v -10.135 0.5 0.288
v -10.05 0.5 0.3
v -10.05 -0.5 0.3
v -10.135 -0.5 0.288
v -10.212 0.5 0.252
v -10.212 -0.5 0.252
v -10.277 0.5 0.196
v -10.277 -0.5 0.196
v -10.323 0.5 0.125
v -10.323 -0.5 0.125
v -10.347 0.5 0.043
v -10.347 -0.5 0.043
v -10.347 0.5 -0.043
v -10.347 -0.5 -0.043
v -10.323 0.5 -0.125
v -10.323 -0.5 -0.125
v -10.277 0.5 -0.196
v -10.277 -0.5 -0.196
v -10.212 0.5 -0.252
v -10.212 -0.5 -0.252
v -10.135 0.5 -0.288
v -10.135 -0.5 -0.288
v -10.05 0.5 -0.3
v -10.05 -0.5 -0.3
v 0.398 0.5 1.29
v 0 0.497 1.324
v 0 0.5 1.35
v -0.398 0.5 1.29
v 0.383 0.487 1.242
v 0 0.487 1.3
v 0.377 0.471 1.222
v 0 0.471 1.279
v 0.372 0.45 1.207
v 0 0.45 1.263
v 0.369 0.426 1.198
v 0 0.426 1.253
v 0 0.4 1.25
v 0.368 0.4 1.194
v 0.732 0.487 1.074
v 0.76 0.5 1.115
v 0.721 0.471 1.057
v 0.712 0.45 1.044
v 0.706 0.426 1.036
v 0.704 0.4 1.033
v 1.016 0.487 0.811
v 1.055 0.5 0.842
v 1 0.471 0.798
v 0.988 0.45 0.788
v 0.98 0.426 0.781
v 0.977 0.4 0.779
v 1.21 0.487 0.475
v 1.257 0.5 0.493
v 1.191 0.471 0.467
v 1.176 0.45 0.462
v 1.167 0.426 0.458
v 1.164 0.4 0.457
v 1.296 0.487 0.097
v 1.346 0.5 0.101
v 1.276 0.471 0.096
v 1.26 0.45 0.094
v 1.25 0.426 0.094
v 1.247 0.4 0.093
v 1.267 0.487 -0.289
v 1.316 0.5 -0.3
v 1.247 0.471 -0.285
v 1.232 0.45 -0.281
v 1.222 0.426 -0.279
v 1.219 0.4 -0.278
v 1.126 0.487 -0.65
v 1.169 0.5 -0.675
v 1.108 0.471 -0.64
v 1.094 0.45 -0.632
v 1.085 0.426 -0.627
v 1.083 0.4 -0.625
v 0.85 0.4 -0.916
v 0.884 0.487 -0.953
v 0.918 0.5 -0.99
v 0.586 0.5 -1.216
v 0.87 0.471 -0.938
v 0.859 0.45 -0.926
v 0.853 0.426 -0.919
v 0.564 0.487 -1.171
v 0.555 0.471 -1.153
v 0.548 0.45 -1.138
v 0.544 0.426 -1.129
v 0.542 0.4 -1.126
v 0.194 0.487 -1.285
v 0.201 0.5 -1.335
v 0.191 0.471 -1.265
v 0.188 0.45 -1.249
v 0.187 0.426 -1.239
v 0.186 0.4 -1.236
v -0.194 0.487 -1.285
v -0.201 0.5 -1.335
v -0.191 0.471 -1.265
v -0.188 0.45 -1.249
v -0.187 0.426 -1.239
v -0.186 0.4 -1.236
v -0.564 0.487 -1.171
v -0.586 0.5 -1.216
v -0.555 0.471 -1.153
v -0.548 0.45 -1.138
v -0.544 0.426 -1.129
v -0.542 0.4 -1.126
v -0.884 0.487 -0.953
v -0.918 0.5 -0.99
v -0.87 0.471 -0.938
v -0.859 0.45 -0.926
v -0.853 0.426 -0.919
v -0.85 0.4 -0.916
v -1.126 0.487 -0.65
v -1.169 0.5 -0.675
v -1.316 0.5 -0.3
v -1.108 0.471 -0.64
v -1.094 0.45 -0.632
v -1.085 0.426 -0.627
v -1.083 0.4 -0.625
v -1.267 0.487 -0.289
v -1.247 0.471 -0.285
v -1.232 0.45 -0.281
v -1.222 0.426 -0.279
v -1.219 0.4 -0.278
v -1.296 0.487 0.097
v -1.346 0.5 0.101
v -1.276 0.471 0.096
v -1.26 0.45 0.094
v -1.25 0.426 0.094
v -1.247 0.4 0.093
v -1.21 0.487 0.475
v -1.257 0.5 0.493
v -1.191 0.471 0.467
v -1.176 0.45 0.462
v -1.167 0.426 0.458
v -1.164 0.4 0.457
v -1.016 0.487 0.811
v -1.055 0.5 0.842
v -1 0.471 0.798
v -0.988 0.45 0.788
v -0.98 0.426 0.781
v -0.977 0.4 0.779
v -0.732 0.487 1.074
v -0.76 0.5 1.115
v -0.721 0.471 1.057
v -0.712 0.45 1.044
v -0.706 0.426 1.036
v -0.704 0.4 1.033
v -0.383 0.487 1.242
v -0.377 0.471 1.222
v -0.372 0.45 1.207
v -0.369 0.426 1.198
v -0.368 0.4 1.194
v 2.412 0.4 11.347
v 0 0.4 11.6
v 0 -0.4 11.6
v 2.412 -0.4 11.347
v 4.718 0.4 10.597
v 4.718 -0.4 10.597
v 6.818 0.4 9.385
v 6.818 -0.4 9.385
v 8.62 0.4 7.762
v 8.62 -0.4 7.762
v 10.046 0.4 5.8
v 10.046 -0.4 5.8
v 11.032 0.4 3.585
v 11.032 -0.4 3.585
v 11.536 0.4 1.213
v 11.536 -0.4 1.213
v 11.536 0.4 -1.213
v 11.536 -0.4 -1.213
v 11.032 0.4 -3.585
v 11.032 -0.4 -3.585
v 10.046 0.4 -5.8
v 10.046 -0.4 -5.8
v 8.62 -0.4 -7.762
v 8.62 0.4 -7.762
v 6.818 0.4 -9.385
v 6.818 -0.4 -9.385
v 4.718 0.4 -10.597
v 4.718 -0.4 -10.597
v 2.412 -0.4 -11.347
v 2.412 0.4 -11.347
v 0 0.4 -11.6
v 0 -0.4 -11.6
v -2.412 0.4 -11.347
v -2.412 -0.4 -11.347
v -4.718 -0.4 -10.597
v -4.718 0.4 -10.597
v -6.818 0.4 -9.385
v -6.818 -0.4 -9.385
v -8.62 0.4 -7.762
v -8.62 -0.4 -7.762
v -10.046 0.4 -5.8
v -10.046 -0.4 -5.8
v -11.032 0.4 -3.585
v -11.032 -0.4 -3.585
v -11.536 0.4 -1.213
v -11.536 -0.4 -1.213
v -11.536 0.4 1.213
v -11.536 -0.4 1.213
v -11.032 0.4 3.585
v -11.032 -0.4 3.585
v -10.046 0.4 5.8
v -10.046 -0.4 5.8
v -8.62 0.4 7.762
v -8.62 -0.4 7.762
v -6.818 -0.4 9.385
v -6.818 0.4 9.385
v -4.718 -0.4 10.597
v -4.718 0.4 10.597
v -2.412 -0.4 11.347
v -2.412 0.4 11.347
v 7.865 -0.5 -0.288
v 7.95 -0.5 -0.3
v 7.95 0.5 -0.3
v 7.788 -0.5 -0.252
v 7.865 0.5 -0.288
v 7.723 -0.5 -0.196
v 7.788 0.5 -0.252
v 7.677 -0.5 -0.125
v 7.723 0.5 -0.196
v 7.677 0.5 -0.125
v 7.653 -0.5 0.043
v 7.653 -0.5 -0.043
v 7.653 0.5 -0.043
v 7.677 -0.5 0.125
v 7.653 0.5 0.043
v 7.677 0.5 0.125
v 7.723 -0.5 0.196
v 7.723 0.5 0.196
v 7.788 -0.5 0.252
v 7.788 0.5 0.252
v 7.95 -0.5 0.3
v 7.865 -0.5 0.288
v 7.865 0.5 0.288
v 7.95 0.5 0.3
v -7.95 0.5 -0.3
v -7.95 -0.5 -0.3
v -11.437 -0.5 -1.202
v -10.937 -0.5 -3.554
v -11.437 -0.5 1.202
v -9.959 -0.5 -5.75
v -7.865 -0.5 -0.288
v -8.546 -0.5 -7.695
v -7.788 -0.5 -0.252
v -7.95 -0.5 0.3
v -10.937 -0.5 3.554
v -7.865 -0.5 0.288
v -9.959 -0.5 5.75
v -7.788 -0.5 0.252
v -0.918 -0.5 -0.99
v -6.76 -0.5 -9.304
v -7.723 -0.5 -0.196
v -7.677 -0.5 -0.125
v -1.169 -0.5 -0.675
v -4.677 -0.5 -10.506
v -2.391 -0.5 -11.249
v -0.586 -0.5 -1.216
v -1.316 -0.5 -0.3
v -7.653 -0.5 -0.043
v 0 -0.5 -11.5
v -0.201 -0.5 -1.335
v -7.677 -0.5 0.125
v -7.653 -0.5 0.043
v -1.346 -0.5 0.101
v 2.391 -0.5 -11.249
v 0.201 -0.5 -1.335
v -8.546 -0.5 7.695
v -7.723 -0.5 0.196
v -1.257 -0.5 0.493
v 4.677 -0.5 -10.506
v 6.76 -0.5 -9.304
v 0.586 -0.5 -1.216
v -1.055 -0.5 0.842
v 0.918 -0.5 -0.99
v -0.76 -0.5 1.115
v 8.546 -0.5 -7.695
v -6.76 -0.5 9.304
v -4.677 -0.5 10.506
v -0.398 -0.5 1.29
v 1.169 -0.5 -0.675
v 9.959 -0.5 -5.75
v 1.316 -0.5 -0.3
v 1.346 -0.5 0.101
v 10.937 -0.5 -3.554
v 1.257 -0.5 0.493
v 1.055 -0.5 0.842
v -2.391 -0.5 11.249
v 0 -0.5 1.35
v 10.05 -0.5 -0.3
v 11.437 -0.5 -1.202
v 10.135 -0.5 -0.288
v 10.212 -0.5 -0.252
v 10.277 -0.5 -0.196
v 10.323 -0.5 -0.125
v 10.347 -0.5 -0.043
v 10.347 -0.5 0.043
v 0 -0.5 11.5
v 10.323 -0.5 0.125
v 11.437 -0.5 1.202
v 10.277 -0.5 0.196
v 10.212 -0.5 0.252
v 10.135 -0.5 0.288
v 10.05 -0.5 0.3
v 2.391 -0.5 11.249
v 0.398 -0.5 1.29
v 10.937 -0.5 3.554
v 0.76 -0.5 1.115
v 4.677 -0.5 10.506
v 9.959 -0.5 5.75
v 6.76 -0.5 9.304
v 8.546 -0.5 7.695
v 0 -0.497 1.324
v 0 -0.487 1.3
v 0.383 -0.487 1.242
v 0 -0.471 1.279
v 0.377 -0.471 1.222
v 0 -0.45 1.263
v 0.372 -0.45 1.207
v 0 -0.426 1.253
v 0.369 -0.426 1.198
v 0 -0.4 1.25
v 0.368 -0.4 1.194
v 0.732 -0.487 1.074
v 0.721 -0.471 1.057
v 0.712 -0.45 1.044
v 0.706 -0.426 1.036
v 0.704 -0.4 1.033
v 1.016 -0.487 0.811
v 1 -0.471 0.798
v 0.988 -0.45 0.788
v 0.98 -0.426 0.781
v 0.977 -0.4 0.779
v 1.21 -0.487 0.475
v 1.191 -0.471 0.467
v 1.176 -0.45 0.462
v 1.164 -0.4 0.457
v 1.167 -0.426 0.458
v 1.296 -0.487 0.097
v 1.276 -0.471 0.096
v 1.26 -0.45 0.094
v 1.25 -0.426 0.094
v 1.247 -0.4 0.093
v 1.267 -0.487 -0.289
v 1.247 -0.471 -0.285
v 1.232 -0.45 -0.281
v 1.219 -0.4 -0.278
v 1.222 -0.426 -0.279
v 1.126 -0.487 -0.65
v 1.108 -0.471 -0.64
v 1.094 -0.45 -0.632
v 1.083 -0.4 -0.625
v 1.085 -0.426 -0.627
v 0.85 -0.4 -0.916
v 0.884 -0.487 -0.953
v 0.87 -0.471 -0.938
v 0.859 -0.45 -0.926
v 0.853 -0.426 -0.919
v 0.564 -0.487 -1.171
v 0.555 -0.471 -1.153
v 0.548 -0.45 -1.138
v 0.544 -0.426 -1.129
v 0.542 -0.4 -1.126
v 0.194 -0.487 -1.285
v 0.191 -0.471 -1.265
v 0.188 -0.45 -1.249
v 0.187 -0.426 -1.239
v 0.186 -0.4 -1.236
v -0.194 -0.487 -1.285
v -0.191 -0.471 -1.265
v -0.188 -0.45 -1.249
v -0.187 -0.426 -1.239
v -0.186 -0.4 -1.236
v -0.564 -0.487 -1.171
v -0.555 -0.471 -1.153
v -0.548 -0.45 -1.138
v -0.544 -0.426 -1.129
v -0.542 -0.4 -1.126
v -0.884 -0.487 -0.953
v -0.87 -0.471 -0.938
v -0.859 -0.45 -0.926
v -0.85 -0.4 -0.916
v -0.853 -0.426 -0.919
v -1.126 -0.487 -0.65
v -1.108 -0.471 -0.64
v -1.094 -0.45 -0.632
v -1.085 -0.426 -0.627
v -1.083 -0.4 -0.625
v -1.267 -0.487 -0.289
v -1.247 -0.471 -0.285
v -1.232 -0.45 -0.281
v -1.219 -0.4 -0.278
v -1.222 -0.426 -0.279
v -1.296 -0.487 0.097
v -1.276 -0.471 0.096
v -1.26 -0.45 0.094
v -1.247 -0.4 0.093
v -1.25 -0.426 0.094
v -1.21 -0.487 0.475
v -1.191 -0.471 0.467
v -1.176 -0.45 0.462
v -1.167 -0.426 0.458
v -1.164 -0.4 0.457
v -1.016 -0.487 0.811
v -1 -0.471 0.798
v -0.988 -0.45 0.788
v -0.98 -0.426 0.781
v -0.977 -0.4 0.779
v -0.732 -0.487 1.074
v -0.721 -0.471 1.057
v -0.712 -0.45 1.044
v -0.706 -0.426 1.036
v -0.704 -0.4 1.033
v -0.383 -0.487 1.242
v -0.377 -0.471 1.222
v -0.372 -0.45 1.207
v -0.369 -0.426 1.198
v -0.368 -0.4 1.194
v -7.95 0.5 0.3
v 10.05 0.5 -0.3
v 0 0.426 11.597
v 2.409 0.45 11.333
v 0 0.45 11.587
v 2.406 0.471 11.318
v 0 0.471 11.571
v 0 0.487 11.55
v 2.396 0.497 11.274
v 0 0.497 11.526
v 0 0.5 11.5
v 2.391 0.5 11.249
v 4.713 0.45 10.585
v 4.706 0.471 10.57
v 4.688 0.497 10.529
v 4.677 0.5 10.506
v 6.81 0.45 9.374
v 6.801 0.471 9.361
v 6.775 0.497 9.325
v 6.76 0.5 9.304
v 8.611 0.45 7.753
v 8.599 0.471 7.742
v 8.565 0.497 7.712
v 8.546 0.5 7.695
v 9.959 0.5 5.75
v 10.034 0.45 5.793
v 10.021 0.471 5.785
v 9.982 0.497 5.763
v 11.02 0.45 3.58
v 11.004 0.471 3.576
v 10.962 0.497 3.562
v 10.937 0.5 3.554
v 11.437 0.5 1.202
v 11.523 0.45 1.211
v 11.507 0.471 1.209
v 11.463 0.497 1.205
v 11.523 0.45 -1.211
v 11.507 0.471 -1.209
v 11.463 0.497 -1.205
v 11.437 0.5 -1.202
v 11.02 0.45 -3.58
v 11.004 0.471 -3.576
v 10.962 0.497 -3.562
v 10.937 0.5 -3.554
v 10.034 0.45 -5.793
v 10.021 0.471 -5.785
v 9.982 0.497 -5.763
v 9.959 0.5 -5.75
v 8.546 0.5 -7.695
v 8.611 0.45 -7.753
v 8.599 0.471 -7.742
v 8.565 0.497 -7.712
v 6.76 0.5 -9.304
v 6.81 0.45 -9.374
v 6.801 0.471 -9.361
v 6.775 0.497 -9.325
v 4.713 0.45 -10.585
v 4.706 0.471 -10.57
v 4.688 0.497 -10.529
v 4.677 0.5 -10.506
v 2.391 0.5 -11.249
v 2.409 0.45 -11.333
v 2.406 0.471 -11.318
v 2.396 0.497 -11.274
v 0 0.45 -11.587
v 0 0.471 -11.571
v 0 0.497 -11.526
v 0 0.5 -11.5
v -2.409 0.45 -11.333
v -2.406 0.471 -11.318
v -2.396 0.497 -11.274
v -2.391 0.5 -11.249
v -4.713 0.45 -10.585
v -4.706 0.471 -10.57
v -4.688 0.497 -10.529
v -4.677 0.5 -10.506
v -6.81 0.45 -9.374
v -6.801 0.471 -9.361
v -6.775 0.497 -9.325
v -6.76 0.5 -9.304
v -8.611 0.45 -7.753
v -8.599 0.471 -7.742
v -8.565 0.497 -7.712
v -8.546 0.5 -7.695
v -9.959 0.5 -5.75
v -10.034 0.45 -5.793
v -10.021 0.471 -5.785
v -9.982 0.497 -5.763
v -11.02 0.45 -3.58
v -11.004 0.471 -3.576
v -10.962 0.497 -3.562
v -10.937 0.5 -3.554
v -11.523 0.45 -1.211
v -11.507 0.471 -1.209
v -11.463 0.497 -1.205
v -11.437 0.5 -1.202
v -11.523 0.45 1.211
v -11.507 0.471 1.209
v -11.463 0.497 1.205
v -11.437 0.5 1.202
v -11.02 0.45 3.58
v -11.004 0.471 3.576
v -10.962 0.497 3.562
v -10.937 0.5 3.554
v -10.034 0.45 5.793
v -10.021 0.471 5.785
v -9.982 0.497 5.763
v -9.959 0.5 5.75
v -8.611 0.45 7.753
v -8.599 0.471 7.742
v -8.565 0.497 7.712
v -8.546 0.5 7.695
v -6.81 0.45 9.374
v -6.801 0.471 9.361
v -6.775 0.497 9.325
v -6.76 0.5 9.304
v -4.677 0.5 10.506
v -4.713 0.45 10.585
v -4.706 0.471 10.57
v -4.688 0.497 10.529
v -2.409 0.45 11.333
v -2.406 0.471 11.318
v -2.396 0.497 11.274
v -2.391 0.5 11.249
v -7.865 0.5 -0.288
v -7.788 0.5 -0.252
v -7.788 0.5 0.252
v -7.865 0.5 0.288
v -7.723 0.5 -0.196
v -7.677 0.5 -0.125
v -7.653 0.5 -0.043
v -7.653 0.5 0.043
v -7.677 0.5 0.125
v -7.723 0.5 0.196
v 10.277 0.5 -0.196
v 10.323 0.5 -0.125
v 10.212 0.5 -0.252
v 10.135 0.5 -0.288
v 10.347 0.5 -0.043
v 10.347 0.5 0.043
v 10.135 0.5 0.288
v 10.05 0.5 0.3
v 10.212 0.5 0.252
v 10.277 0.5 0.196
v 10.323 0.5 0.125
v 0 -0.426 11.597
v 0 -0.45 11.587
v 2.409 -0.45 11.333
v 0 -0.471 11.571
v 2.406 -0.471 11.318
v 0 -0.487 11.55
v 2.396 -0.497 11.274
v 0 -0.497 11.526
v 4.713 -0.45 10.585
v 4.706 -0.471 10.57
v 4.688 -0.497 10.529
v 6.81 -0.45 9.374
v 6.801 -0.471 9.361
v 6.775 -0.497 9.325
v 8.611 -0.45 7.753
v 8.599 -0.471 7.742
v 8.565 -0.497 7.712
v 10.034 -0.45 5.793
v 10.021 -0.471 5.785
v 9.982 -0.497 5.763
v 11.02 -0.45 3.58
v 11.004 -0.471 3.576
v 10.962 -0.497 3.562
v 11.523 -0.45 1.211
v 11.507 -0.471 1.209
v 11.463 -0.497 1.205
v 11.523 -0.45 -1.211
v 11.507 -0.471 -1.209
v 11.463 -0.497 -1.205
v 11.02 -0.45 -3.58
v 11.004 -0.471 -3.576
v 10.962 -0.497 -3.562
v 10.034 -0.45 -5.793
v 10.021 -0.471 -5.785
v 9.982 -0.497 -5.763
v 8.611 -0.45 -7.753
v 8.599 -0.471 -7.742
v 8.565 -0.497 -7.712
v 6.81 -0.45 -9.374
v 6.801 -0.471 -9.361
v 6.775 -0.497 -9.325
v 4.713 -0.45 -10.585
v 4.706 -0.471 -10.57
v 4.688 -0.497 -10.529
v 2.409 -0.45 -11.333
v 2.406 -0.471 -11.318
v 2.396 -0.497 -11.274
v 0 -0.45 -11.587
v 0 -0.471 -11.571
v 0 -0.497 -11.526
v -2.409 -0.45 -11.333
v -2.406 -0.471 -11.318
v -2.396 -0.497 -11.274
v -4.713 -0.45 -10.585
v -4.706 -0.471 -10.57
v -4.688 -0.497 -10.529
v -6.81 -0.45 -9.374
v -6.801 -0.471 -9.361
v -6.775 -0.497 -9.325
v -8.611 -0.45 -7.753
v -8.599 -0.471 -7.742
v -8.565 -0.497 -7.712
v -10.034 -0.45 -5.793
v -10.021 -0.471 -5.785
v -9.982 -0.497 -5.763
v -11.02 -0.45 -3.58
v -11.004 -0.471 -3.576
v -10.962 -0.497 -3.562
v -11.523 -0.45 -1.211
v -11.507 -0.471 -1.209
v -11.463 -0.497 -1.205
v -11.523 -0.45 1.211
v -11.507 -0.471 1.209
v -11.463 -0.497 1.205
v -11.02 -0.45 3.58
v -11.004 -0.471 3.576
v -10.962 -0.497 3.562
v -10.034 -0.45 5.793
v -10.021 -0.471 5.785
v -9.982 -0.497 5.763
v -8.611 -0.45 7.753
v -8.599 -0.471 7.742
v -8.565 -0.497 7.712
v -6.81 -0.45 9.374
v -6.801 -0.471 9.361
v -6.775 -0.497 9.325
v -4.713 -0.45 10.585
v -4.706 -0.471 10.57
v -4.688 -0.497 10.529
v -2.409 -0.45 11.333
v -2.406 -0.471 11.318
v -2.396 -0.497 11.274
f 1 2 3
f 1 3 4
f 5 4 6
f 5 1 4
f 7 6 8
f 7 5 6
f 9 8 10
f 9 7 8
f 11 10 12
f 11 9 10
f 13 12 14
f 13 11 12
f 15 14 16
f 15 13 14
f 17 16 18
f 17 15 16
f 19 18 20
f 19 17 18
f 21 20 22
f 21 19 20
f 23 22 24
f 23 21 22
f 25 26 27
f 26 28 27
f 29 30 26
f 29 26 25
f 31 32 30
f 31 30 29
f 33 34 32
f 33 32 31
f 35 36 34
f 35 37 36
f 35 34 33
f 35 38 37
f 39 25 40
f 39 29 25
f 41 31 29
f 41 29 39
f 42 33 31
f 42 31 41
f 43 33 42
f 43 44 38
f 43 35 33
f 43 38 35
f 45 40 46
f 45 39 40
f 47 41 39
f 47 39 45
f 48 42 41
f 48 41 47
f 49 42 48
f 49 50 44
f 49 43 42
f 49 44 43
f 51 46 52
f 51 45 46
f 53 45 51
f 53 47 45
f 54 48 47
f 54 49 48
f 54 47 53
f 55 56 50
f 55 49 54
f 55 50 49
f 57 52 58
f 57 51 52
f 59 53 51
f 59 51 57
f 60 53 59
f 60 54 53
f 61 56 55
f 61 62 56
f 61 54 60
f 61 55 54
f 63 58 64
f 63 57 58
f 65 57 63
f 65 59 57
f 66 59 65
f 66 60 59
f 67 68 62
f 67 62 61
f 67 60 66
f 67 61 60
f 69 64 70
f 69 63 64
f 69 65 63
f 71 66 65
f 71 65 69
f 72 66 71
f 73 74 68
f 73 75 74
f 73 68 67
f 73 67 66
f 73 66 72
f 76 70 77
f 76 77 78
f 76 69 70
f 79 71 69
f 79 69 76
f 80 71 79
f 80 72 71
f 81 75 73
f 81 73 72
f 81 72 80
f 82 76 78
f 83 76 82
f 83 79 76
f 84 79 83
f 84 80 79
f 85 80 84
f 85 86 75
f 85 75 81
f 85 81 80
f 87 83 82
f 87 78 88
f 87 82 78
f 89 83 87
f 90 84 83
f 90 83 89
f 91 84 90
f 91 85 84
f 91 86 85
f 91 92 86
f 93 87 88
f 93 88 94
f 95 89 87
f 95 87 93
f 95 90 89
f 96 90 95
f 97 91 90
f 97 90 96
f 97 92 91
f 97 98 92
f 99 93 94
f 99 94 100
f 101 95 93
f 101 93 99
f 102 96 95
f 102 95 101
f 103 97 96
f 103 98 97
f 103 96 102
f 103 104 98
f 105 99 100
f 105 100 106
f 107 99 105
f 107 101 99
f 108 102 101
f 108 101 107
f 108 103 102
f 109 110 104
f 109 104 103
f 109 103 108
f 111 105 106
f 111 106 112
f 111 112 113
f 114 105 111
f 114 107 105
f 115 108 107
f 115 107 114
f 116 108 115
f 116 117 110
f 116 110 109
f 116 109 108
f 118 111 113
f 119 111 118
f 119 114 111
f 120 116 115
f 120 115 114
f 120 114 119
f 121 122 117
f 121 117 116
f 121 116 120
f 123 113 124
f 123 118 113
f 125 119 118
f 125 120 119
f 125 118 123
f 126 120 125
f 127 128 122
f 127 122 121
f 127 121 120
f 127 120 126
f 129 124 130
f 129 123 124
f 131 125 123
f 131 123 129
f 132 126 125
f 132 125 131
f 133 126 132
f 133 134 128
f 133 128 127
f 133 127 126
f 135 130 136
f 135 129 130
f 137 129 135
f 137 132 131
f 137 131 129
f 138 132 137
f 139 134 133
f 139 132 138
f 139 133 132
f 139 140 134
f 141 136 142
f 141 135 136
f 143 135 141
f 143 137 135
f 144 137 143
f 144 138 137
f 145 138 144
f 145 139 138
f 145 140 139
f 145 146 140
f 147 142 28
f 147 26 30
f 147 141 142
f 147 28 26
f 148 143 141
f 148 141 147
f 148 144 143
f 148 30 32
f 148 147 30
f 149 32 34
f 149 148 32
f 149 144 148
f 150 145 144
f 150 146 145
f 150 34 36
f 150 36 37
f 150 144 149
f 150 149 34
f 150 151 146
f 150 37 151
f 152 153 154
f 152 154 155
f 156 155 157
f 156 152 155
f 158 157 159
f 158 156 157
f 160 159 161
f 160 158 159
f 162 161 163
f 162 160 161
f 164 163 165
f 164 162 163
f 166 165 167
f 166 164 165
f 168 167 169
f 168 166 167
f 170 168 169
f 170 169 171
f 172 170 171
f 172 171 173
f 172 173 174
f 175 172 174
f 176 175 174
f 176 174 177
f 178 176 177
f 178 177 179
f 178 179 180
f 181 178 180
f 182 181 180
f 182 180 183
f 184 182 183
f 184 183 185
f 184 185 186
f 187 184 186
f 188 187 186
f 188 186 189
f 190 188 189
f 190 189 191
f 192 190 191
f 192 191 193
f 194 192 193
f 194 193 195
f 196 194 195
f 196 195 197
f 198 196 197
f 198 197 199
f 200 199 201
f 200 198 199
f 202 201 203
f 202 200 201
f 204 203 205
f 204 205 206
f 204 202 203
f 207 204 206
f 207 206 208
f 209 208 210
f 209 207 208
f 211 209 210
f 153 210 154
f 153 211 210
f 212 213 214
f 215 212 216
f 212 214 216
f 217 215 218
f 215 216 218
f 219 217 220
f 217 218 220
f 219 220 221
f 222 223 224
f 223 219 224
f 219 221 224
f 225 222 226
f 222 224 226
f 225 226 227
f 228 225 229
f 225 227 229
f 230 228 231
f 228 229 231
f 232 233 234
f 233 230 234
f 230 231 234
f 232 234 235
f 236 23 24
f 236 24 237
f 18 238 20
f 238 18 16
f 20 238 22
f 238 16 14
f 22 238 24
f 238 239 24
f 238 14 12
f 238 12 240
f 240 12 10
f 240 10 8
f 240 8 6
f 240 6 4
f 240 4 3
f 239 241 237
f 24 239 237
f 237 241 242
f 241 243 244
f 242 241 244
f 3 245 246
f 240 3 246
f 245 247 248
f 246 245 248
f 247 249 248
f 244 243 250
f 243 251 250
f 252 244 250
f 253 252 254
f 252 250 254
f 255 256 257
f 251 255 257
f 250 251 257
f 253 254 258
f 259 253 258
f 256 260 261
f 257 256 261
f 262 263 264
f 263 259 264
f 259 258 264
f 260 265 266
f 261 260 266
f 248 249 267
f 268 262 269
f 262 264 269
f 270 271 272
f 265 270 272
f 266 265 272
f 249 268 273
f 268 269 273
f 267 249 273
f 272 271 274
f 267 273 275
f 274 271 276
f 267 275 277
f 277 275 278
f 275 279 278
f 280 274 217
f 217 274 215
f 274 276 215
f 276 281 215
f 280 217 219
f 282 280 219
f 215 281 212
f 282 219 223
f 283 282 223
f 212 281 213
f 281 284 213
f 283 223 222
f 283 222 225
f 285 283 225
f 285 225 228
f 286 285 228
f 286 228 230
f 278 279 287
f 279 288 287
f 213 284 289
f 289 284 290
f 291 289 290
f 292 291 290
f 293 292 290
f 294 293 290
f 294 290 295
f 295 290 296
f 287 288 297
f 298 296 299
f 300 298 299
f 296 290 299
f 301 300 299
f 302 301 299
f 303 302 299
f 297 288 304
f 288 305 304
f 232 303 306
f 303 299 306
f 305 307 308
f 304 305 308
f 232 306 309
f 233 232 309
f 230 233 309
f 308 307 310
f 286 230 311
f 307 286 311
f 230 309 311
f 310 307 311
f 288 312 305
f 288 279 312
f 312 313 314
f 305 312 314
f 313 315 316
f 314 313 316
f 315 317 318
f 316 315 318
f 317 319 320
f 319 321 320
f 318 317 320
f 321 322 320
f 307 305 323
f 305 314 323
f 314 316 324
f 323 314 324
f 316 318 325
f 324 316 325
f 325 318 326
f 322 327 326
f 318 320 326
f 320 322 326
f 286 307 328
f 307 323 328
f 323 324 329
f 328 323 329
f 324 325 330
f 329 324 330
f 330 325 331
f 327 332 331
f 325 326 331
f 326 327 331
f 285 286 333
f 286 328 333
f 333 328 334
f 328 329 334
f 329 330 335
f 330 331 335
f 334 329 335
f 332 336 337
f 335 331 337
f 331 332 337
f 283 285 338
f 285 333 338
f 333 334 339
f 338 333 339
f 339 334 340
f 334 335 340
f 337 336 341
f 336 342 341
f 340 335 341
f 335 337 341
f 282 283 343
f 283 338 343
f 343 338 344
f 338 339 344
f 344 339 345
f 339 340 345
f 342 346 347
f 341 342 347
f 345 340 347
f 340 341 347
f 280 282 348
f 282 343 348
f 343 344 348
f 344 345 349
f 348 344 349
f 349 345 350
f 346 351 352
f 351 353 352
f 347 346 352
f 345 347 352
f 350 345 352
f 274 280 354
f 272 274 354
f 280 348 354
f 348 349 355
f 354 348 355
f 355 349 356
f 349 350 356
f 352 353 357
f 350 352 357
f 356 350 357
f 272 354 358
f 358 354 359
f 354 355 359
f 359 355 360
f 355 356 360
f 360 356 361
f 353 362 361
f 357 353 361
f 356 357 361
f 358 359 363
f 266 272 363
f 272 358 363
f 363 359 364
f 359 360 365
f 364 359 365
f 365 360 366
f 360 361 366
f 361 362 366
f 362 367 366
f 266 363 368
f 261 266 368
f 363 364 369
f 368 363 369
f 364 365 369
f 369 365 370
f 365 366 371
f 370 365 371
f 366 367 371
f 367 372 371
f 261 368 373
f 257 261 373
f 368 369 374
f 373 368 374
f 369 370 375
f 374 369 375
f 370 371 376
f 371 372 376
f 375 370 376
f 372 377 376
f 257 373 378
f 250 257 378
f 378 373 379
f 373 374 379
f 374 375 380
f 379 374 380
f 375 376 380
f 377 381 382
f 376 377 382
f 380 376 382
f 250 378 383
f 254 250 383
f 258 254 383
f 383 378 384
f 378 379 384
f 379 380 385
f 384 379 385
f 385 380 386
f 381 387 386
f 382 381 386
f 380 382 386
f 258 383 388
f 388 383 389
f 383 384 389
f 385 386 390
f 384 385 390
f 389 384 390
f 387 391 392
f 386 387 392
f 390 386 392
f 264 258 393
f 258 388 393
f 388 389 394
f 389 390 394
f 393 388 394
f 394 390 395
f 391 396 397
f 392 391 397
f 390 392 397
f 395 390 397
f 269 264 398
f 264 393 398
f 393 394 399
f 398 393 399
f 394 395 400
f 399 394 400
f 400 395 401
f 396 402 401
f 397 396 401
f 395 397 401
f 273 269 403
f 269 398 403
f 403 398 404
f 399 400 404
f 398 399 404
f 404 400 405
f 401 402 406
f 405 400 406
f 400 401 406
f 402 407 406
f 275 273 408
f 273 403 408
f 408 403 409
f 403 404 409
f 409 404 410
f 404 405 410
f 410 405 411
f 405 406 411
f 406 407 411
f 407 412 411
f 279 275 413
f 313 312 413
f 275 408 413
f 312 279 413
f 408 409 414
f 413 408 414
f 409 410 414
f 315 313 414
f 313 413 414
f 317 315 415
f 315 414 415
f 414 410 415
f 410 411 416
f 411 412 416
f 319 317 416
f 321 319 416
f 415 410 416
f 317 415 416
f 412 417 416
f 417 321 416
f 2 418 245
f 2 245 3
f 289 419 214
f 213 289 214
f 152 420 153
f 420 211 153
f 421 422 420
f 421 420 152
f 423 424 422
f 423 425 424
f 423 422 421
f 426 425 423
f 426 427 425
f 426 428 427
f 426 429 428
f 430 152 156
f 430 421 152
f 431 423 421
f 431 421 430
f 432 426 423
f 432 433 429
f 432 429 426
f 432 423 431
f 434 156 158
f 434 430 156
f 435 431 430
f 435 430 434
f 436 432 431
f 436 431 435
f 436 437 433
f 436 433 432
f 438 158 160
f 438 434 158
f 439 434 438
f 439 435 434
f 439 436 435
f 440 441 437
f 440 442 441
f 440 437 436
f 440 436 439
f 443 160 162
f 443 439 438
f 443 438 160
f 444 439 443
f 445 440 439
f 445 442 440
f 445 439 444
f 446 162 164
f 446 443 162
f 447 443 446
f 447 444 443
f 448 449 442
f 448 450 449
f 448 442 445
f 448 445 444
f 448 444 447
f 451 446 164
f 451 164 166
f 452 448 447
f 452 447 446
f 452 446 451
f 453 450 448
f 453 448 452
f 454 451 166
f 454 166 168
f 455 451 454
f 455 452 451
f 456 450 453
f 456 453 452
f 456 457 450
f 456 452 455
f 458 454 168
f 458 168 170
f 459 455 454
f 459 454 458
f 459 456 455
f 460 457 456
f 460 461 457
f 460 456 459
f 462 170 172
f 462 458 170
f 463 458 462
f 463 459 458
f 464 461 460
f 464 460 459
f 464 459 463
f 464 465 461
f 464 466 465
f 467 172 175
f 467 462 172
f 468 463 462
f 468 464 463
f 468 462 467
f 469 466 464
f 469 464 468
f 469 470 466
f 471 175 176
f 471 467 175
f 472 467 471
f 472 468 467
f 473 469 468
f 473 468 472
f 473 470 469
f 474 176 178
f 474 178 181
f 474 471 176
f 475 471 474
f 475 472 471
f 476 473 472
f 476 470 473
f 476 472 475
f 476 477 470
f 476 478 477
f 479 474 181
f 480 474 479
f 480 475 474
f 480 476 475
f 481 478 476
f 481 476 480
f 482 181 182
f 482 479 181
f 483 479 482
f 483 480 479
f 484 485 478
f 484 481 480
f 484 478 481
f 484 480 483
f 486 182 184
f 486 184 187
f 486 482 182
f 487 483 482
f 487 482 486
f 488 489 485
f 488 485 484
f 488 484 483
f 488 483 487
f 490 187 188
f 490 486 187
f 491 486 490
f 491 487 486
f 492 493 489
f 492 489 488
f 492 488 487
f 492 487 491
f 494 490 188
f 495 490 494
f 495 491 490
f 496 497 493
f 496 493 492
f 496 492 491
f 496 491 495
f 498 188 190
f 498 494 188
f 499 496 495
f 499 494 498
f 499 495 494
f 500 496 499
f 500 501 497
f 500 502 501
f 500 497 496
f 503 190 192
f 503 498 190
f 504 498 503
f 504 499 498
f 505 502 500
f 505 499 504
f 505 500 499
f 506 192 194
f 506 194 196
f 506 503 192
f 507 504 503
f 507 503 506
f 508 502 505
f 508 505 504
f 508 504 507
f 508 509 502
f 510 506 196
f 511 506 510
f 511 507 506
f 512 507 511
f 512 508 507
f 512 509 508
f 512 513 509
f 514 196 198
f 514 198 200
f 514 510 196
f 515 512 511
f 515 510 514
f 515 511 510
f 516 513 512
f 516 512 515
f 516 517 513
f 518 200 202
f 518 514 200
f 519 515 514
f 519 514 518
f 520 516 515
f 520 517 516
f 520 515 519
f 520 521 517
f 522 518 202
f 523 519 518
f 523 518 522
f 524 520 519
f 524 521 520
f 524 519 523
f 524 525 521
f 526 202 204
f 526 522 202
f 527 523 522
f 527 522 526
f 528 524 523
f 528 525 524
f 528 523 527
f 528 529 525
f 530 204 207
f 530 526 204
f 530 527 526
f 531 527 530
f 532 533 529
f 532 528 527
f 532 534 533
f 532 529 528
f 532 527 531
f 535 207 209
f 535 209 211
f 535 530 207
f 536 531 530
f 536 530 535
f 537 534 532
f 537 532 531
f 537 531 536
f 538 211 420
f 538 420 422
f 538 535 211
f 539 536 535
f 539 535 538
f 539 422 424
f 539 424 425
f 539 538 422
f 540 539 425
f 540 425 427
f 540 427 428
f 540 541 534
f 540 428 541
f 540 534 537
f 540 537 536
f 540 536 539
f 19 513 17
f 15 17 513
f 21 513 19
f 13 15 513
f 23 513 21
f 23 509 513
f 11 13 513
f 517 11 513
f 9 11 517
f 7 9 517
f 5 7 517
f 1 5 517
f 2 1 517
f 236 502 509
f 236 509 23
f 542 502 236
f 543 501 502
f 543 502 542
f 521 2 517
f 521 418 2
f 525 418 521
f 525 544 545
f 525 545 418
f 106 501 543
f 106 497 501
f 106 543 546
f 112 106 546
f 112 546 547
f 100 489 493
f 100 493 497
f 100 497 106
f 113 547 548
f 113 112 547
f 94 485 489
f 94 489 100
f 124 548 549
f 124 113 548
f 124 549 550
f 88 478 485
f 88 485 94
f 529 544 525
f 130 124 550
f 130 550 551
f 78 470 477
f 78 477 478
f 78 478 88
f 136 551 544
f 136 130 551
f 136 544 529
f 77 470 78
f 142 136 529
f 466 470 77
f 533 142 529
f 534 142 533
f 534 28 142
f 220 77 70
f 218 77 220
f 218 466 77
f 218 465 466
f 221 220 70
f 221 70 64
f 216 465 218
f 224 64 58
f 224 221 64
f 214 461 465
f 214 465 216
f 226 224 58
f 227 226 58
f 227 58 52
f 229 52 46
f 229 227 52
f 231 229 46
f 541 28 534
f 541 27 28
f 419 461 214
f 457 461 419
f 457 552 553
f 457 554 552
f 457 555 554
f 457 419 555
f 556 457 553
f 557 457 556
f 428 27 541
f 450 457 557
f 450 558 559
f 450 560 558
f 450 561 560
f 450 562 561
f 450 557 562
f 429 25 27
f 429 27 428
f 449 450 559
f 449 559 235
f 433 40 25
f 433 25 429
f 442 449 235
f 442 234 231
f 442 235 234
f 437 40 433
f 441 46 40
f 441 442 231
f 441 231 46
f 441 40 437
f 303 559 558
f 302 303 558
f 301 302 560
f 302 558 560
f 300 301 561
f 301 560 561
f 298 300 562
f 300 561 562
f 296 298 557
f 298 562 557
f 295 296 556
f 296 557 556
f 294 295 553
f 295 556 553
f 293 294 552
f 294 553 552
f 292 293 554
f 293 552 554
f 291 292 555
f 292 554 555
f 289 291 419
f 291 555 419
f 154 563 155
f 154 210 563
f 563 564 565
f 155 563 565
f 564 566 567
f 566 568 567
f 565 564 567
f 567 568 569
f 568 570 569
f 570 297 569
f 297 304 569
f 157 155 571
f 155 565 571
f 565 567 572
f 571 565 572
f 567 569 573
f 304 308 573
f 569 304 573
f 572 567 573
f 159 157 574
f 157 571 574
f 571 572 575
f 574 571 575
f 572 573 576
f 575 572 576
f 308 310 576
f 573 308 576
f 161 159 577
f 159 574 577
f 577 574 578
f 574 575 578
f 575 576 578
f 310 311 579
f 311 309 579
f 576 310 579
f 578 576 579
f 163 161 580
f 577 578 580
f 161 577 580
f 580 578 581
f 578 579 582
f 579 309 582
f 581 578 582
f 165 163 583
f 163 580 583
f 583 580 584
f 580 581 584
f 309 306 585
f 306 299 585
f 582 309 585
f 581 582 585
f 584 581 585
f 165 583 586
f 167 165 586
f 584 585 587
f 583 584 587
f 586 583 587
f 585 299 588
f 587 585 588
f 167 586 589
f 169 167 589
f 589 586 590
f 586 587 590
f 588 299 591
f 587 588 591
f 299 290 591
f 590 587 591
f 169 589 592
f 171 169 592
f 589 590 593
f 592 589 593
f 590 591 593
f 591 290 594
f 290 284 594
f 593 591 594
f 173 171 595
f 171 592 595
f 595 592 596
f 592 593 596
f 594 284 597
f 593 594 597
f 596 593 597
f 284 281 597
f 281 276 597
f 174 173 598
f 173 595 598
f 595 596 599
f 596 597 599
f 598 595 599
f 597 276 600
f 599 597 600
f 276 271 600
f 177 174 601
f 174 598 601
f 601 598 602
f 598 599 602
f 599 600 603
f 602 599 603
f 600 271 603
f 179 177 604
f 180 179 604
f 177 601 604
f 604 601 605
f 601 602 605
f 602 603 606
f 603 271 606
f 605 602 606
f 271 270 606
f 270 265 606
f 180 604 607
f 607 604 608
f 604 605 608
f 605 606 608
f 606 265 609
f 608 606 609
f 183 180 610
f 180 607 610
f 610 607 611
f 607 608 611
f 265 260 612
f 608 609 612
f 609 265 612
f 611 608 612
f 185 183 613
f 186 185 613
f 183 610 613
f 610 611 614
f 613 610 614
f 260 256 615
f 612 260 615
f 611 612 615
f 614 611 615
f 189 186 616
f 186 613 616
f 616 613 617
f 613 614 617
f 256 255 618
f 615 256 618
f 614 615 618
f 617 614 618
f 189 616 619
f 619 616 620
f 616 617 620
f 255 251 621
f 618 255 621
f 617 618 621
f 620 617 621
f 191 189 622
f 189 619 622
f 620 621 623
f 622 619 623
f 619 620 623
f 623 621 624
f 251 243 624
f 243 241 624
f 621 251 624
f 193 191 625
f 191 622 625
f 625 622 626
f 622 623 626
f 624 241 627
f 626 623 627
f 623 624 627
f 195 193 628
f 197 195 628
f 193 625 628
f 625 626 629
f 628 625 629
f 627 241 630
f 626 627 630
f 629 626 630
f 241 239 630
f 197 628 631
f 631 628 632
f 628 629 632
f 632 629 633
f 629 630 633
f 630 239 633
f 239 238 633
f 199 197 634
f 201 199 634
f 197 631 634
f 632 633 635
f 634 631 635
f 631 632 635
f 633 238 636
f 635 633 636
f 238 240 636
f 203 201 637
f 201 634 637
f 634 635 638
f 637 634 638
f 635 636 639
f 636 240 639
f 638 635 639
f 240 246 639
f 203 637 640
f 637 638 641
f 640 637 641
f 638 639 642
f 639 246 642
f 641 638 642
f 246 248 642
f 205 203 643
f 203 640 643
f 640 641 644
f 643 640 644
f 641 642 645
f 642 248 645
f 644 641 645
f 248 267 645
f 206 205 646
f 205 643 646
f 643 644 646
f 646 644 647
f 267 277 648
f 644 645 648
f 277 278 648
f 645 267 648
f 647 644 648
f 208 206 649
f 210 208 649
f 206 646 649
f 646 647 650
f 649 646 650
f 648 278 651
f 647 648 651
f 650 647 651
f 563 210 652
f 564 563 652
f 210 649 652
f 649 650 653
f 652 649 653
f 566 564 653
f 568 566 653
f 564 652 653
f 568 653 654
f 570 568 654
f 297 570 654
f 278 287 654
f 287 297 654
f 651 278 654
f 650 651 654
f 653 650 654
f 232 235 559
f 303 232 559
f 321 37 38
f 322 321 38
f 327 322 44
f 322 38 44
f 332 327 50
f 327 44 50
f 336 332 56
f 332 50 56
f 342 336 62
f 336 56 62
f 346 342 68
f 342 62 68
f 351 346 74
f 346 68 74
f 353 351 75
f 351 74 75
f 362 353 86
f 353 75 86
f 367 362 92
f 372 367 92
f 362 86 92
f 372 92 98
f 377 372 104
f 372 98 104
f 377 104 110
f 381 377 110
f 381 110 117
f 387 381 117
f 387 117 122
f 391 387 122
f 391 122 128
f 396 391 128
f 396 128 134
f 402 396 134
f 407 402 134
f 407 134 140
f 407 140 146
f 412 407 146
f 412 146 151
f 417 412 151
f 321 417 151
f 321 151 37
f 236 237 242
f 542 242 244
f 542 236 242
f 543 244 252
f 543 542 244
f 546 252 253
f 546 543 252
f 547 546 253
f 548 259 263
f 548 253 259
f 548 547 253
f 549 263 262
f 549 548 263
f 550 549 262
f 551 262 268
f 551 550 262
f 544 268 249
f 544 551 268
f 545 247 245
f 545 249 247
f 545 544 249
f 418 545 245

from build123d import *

# Parameters (mm, degrees)
SKETCH1_R           = 11.6
BOSS_EXTRUDE1_DEPTH = 0.5
CUT_EXTRUDE1_REACH  = 18.435
CUT_EXTRUDE2_REACH  = 18.435
SKETCH3_R           = 1.25
FILLET1_R           = 0.1


with BuildPart() as part:
    # Sketch1 → Boss-Extrude1 (new, symmetric)
    with BuildSketch(Plane(origin=(0, 0, 0), x_dir=(1, 0, 0), z_dir=(0, 1, 0))):
        with Locations(Location((0, 0, 0), (0, 0, 270))):
            Circle(SKETCH1_R)
    extrude(amount=BOSS_EXTRUDE1_DEPTH, both=True)

    # Sketch2 → Cut-Extrude1 (cut, up to next)
    with BuildSketch(Plane(origin=(0, 0.5, 0), x_dir=(1, 0, 0), z_dir=(0, 1, 0)), mode=Mode.PRIVATE) as cut_extrude1_sk1:
        with BuildLine():
            Line((-10.05, 0.3), (-7.95, 0.3))
            ThreePointArc((-7.95, 0.3), (-7.65, 0), (-7.95, -0.3))
            Line((-7.95, -0.3), (-10.05, -0.3))
            ThreePointArc((-10.05, -0.3), (-10.35, 0), (-10.05, 0.3))
        make_face()
    cut_extrude1_tool1 = extrude(cut_extrude1_sk1.sketch, amount=-CUT_EXTRUDE1_REACH, mode=Mode.PRIVATE) & part.part
    cut_extrude1 = cut_extrude1_tool1.solids().sort_by_distance((-9, 0.5, 0))[0]
    add(cut_extrude1, mode=Mode.SUBTRACT)

    # Mirror1: Cut-Extrude1 across plane
    add(cut_extrude1.mirror(Plane(origin=(0, 0, 0), x_dir=(0, 0, 1), z_dir=(1, 0, 0))), mode=Mode.SUBTRACT)

    # Sketch3 → Cut-Extrude2 (cut, up to next)
    with BuildSketch(Plane(origin=(0, 0.5, 0), x_dir=(1, 0, 0), z_dir=(0, 1, 0)), mode=Mode.PRIVATE) as cut_extrude2_sk1:
        with Locations(Location((0, 0, 0), (0, 0, 270))):
            Circle(SKETCH3_R)
    cut_extrude2_tool1 = extrude(cut_extrude2_sk1.sketch, amount=-CUT_EXTRUDE2_REACH, mode=Mode.PRIVATE) & part.part
    add(cut_extrude2_tool1.solids().sort_by_distance((0, 0.5, 0))[0], mode=Mode.SUBTRACT)

    # Fillet1
    fillet1_edges = [part.edges().sort_by_distance(p)[0] for p in [
        (0, -0.5, -11.6),
        (0, 0.5, -1.25),
        (0, -0.5, -1.25),
        (0, 0.5, -11.6),
    ]]
    fillet(fillet1_edges, radius=FILLET1_R)


solid = part.part
